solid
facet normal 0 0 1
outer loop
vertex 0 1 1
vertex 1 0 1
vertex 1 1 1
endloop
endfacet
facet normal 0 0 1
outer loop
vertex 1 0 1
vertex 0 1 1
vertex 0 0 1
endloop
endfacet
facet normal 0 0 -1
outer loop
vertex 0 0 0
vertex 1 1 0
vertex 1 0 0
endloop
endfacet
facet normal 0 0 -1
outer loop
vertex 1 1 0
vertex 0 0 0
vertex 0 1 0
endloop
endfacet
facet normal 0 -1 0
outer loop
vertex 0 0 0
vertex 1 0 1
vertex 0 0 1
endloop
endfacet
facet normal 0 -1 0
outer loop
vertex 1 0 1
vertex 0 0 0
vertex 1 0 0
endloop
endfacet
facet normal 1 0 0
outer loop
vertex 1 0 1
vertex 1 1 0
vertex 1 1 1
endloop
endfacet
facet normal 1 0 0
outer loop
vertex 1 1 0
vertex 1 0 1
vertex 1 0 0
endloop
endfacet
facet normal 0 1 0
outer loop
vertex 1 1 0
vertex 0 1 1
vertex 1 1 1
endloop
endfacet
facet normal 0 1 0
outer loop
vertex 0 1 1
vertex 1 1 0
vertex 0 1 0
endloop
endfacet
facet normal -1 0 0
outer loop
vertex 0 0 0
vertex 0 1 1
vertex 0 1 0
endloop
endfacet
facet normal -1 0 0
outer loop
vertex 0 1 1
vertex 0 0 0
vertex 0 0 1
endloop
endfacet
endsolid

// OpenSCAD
// Test translation by NaN and Infinity

// NaN test - cube(2) should not be rendered
cube(1);
angle = asin(1.1);
render()
rotate([0, 0, angle])
cube(2);

// FIXME: how do you test infinity?
